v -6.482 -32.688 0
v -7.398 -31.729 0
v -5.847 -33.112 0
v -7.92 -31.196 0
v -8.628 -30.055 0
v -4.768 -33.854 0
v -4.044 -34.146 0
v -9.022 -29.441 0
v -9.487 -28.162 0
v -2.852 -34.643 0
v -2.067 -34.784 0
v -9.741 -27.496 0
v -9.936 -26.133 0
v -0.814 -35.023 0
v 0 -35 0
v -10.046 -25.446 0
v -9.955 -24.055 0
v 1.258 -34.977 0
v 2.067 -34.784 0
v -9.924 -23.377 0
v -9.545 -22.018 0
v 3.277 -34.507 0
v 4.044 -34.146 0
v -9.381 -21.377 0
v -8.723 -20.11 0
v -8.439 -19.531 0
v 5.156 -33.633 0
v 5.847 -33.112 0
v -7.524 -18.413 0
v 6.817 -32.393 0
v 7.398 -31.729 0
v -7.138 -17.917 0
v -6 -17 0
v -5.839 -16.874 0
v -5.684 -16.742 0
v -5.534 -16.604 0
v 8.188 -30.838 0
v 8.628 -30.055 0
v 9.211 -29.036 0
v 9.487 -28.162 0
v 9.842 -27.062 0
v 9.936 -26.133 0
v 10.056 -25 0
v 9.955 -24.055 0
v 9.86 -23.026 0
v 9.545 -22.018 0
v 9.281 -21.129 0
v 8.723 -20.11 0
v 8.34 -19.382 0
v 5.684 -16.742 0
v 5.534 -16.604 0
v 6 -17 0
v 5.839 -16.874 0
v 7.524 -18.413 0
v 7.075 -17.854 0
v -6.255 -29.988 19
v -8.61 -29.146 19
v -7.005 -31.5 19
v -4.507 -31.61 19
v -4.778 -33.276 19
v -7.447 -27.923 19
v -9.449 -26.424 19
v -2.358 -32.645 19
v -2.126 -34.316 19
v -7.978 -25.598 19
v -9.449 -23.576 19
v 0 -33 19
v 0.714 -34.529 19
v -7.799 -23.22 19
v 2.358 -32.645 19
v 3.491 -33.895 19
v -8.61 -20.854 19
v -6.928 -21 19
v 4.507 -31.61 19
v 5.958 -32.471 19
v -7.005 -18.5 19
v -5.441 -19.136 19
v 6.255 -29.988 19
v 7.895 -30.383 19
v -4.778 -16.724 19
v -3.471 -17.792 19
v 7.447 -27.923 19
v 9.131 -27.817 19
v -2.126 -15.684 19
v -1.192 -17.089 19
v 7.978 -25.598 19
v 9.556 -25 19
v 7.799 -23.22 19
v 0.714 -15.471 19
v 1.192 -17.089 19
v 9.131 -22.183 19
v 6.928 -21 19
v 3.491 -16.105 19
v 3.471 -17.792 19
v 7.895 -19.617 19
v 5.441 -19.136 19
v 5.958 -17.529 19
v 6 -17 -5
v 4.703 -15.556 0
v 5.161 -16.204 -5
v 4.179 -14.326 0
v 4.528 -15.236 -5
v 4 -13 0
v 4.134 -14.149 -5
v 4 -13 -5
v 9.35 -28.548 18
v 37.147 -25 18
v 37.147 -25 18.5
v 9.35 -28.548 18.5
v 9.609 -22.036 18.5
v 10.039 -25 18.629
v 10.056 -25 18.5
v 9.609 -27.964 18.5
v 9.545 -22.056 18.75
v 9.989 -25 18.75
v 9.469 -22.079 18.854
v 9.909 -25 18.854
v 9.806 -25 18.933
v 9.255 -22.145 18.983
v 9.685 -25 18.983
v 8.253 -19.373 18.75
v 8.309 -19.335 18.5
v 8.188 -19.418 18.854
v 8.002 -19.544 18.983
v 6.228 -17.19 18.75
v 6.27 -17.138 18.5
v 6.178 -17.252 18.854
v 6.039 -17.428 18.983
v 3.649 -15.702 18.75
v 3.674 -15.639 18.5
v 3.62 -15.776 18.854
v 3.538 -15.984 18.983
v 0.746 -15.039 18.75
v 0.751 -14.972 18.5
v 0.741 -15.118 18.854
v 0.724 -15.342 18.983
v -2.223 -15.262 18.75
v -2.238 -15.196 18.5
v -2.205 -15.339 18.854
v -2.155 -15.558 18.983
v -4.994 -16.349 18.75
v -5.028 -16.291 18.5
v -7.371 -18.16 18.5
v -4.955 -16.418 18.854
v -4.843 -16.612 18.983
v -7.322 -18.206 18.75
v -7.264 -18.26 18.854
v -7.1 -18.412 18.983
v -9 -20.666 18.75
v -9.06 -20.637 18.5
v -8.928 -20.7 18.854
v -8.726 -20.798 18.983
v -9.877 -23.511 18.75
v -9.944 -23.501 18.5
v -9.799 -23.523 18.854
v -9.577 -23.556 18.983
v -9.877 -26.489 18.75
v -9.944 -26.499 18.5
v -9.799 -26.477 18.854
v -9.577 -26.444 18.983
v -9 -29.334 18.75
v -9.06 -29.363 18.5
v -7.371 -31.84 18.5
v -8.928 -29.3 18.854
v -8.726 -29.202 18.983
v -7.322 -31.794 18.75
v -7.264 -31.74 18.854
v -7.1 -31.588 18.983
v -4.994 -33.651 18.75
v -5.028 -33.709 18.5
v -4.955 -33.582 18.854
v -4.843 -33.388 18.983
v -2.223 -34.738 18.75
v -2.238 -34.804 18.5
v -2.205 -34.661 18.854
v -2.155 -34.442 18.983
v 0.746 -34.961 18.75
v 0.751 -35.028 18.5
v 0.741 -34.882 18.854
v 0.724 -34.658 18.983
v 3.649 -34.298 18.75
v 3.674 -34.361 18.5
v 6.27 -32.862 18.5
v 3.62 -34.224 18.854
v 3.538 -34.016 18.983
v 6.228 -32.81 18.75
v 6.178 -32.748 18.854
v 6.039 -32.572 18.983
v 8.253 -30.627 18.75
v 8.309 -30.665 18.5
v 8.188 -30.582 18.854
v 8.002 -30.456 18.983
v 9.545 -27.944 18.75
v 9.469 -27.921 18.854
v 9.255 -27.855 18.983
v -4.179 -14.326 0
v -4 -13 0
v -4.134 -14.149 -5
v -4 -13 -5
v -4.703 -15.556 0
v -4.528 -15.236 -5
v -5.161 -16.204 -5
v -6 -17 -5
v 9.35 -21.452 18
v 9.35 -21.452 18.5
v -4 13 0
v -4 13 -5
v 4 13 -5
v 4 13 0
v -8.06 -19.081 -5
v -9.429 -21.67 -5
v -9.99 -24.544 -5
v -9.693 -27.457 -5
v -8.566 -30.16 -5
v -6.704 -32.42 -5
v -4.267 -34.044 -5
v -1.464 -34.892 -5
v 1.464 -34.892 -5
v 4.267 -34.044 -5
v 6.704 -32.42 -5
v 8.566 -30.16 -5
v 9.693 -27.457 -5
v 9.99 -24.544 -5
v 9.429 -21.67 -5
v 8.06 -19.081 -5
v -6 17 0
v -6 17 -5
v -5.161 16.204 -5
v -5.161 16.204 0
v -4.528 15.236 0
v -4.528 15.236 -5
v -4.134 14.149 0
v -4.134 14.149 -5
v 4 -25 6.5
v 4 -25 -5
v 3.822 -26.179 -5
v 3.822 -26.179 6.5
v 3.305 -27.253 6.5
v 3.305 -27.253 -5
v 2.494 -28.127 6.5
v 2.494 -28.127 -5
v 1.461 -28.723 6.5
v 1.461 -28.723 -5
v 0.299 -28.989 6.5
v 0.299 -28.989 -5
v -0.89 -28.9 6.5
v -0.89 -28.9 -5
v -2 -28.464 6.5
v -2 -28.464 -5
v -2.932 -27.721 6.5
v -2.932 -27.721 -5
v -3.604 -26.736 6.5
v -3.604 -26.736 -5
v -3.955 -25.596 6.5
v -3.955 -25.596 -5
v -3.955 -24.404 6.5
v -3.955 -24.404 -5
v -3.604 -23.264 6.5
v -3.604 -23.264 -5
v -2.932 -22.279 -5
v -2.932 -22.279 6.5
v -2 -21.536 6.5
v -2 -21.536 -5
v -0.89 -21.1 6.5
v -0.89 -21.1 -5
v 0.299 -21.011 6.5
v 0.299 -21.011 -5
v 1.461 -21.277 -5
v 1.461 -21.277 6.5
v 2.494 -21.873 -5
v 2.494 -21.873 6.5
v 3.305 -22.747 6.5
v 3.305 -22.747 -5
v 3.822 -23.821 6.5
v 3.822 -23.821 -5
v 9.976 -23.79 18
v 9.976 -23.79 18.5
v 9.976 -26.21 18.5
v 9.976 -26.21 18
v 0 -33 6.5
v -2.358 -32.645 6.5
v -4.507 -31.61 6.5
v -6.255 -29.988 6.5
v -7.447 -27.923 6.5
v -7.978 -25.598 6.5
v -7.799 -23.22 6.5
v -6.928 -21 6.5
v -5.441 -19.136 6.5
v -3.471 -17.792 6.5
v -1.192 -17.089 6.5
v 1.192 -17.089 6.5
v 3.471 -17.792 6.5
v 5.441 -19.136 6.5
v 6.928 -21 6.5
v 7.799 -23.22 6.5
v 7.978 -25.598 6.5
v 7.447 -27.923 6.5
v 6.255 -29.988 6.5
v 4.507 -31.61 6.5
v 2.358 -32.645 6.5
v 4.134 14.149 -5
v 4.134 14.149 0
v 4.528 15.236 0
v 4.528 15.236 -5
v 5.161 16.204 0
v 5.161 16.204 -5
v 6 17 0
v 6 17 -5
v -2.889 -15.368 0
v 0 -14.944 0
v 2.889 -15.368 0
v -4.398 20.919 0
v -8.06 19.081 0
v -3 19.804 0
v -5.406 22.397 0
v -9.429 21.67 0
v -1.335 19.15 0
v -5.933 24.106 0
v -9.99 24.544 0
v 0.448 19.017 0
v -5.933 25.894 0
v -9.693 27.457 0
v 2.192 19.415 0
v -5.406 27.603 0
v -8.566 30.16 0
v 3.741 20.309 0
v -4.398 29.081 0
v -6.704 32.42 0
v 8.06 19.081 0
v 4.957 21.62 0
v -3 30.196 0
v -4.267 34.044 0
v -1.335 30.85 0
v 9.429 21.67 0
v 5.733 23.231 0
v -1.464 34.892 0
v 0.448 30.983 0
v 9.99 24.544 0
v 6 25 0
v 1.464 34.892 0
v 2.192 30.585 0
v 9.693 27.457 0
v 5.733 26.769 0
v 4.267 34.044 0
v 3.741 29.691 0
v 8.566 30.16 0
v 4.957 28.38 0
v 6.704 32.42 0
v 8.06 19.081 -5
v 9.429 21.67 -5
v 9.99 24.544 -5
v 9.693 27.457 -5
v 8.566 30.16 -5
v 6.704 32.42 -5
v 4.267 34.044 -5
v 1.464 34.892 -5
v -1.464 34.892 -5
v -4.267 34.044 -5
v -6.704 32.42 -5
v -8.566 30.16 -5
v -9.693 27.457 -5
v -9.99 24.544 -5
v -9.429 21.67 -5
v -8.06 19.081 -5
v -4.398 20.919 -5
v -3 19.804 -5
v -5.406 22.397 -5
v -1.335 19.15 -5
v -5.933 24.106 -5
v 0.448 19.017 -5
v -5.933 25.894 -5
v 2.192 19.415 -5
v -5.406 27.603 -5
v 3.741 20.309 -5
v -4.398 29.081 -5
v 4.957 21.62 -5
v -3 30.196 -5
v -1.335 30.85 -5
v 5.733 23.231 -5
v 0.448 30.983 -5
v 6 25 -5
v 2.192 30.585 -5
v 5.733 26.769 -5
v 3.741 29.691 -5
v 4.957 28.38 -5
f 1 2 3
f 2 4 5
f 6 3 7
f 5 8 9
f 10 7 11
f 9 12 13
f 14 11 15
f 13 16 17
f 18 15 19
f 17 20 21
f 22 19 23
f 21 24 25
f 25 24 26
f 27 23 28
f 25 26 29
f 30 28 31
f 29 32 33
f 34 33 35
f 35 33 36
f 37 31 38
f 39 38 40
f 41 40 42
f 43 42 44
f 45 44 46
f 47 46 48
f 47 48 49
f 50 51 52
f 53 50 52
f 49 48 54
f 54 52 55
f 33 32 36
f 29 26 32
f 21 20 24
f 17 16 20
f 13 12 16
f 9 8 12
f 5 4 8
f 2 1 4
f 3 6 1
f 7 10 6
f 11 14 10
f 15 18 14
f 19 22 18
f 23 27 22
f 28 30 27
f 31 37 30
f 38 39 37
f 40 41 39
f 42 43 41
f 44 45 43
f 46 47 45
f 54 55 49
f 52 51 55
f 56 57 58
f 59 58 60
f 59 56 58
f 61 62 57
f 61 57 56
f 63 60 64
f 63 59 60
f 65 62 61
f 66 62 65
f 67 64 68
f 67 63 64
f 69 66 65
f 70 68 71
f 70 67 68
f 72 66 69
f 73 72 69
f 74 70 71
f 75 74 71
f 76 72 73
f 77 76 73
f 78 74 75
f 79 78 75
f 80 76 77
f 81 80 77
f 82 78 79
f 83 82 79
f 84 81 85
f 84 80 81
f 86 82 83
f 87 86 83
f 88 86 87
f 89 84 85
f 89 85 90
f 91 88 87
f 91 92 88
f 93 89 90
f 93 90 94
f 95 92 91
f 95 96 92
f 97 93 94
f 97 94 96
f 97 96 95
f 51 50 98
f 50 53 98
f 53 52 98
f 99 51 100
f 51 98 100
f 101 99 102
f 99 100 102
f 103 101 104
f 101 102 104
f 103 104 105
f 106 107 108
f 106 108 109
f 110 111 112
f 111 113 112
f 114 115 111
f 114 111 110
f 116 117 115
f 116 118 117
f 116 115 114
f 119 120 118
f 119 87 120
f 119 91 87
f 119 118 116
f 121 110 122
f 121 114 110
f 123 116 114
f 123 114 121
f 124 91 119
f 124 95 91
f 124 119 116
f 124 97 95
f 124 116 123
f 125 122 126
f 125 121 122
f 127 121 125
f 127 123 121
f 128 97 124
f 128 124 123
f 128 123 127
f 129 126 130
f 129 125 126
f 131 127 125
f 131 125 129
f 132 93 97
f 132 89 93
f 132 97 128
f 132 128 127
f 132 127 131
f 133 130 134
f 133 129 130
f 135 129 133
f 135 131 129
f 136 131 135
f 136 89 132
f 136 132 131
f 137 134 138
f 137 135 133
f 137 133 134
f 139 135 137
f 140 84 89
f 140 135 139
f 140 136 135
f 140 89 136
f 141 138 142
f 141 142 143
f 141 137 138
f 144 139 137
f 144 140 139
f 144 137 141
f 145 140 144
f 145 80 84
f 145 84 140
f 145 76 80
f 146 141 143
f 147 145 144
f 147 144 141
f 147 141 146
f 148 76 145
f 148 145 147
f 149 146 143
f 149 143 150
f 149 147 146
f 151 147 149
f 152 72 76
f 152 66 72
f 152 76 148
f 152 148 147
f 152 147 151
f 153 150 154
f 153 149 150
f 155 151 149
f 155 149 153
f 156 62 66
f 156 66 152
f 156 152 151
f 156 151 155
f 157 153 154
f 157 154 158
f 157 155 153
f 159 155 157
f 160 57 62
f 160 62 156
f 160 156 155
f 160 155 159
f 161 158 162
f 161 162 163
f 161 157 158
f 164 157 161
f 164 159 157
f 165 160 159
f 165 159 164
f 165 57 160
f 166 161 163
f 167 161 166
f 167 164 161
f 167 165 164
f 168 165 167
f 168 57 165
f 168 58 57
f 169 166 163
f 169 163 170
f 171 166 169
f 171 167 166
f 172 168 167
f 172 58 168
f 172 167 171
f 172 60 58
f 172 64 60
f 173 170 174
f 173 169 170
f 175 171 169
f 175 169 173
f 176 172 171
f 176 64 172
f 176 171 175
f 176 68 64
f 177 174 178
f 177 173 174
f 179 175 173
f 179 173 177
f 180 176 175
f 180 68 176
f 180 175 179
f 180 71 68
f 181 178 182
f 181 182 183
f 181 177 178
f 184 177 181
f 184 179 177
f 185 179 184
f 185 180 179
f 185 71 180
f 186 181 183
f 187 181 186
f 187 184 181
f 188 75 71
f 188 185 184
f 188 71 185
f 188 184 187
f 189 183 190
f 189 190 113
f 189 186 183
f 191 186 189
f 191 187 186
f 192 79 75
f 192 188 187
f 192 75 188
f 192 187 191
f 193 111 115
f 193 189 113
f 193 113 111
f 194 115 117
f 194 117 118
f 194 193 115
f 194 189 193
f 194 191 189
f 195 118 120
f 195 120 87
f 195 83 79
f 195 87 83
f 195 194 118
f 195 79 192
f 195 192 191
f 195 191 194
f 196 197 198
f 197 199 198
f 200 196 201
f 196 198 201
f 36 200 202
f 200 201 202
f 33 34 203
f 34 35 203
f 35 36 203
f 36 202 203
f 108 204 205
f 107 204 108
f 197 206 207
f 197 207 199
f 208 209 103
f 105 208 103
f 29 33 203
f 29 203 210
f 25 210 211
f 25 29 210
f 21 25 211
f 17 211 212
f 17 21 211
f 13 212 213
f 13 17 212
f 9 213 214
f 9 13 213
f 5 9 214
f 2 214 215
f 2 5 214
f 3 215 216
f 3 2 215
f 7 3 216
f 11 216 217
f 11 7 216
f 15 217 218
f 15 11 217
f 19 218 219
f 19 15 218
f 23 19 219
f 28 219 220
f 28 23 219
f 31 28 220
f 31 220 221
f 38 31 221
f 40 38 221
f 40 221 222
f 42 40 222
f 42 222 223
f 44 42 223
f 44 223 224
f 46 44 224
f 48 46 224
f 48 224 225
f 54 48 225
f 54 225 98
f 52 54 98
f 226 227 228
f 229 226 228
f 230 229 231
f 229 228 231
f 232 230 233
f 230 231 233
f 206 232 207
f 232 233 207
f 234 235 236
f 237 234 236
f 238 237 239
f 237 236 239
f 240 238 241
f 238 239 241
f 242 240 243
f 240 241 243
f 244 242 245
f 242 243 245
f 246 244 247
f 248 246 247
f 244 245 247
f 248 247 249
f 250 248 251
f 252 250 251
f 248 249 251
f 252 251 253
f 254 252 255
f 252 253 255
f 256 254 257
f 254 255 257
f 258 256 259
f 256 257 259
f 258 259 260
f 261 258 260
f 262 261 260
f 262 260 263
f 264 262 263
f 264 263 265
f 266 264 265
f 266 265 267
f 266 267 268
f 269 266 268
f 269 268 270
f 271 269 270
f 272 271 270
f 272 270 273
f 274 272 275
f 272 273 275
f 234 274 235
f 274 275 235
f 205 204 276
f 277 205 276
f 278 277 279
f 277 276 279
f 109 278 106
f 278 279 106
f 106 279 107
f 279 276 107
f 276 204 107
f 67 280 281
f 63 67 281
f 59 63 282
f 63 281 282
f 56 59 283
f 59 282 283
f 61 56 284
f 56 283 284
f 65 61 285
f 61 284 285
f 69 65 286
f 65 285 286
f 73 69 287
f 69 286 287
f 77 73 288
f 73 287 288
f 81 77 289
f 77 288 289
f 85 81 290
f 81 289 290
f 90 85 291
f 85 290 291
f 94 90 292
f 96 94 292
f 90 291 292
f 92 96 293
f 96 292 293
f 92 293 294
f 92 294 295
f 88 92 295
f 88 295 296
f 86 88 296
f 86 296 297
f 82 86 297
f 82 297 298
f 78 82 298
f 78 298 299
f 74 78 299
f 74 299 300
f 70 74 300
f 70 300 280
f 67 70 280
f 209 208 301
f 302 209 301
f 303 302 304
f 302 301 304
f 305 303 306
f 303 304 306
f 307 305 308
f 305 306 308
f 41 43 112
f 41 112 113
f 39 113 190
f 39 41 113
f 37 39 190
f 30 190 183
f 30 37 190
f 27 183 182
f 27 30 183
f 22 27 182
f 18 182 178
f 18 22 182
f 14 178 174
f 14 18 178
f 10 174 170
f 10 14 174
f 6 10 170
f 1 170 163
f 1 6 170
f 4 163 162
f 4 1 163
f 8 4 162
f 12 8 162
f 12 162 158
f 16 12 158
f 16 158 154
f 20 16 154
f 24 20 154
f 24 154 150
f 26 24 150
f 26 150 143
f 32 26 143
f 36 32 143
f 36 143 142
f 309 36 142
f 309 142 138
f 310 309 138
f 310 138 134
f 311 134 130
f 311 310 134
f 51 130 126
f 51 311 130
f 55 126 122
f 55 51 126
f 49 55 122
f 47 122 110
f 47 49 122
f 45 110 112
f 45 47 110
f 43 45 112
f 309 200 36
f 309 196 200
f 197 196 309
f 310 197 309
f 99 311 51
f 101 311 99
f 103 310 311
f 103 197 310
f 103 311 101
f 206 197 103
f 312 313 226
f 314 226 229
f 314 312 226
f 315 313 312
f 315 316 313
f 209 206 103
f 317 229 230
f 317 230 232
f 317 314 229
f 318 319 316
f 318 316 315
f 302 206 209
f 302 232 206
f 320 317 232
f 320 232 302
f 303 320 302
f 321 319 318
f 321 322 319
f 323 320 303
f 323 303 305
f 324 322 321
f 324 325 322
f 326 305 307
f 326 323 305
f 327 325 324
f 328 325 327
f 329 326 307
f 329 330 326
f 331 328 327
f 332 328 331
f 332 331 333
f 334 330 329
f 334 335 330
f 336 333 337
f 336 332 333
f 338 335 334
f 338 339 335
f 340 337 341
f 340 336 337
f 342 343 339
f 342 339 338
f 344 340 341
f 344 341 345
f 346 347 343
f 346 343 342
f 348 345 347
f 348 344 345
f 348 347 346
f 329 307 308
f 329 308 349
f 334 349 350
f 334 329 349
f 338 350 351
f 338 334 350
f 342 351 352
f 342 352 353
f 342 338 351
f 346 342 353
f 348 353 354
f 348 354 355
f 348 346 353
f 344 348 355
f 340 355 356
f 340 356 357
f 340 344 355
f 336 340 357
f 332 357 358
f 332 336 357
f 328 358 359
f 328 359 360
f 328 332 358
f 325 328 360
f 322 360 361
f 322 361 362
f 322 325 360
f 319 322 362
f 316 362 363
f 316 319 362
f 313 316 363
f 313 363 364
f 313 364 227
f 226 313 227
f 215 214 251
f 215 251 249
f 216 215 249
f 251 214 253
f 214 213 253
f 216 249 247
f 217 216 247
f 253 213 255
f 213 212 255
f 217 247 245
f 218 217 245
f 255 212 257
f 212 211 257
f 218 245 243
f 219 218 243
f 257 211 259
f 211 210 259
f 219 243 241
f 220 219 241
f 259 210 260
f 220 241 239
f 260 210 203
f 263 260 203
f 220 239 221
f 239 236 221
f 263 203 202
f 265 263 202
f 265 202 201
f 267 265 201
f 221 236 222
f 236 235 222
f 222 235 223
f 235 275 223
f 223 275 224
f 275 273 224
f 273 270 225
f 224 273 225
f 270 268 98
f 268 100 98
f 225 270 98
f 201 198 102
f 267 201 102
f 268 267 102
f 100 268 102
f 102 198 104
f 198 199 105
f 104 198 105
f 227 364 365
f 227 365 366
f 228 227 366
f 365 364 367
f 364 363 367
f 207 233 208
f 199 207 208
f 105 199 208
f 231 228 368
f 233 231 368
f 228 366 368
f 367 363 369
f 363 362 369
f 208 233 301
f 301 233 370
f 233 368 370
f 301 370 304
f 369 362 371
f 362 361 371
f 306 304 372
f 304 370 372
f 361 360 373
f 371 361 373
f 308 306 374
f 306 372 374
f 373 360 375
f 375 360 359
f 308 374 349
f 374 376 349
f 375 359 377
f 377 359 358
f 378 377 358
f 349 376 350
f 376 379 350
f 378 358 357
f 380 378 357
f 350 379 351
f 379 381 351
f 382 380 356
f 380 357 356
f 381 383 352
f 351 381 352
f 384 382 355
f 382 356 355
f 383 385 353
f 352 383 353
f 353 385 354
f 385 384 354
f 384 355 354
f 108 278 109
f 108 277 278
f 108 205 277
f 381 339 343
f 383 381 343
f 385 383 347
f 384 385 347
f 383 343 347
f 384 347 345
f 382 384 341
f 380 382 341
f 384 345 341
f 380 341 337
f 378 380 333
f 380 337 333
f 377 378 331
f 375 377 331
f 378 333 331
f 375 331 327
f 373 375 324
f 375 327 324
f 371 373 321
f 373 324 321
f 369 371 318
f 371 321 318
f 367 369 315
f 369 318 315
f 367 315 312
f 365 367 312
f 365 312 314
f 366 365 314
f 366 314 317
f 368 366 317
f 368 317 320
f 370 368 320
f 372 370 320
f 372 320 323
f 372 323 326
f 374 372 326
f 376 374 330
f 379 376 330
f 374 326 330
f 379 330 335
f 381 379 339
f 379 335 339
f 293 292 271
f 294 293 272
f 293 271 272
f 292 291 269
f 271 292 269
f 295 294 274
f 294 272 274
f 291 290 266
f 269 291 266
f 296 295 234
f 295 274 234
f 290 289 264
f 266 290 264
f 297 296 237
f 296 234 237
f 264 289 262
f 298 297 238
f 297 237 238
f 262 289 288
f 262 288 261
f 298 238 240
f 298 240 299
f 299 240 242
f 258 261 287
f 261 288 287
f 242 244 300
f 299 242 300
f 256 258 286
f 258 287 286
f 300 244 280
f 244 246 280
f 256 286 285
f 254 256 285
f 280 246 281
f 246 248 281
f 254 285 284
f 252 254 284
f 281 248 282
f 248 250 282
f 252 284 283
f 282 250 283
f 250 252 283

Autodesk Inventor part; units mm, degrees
ref_plane "YZ Plane" through (0, 0, 0) normal (1, 0, 0) x (0, 1, 0)
ref_plane "XZ Plane" through (0, 0, 0) normal (0, 1, 0) x (-1, 0, 0)
sketch "Sketch1" plane through (0, 0, 0) normal (0, 0, 1) x (1, 0, 0)
  line L0 (-4, 15.8348) -> (-4, -15.8348)
  line L1 (4, 15.8348) -> (4, -15.8348)
  arc A0 (4, 15.8348) -> (-4, 15.8348) centre (0, 25) ccw
  arc A1 (-4, -15.8348) -> (4, -15.8348) centre (0, -25) ccw
  circle A2 centre (0, 25) radius 6
  circle A3 centre (0, -25) radius 4
  point P0 (0, 0)
  point P1 (-4, 0)
  dimension "d0" = 50
  dimension "d1" = 8
  dimension "d2" = 4
  dimension "d3" = 10
  dimension "d4" = 10
  dimension "d5" = 12
  dimension "d6" = 8
extrude "Extrusion1" add sketch "Sketch1" against normal blind 5
fillet "Fillet1" radius 5 4 edges at (4, 15.8348, -2.5) (-4, 15.8348, -2.5) (4, -15.8348, -2.5) (-4, -15.8348, -2.5)
sketch "Sketch2" plane through (0, 0, 0) normal (0, 0, 1) x (1, 0, 0)
  circle A0 centre (0, -25) radius 4 projected
  circle A1 centre (0, -25) radius 10.0559
  point P0 (0, 0)
extrude "Extrusion2" add sketch "Sketch2" along normal blind 19
sketch "Sketch3" plane through (0, -25, 19) normal (0, 0, 1) x (1, 0, 0)
  circle A0 centre (0, 0) radius 10.0559 projected
  point P0 (0, 25)
hole "Hole1" at (0, -25, 19) direction (0, 0, -1) diameter 16 depth 12.5
fillet "Fillet2" radius 0.5 1 edges at (-10.0559, -25, 19)
ref_plane "Work Plane1" through (0, 0, 18) normal (0, 0, 1) x (1, 0, 0)
sketch "Sketch5" plane through (0, 0, 18) normal (0, 0, 1) x (1, 0, 0)
  arc A0 (-6, -17) -> (6, -17) centre (0, -25) ccw projected
  line L0 (9.3495, -21.4523) -> (37.147, -25)
  line L1 (37.147, -25) -> (9.3495, -28.5477)
  line L2 (0, -25) -> (37.147, -25) construction
  arc A1 (9.3495, -28.5477) -> (9.3495, -21.4523) centre (0.7935, -25) ccw
  point P0 (0, 0)
extrude "Extrusion3" add sketch "Sketch5" along normal blind 0.5 separate body contours A1 L0 L1
properties part number "203 part 1" material "Steel, Alloy"
